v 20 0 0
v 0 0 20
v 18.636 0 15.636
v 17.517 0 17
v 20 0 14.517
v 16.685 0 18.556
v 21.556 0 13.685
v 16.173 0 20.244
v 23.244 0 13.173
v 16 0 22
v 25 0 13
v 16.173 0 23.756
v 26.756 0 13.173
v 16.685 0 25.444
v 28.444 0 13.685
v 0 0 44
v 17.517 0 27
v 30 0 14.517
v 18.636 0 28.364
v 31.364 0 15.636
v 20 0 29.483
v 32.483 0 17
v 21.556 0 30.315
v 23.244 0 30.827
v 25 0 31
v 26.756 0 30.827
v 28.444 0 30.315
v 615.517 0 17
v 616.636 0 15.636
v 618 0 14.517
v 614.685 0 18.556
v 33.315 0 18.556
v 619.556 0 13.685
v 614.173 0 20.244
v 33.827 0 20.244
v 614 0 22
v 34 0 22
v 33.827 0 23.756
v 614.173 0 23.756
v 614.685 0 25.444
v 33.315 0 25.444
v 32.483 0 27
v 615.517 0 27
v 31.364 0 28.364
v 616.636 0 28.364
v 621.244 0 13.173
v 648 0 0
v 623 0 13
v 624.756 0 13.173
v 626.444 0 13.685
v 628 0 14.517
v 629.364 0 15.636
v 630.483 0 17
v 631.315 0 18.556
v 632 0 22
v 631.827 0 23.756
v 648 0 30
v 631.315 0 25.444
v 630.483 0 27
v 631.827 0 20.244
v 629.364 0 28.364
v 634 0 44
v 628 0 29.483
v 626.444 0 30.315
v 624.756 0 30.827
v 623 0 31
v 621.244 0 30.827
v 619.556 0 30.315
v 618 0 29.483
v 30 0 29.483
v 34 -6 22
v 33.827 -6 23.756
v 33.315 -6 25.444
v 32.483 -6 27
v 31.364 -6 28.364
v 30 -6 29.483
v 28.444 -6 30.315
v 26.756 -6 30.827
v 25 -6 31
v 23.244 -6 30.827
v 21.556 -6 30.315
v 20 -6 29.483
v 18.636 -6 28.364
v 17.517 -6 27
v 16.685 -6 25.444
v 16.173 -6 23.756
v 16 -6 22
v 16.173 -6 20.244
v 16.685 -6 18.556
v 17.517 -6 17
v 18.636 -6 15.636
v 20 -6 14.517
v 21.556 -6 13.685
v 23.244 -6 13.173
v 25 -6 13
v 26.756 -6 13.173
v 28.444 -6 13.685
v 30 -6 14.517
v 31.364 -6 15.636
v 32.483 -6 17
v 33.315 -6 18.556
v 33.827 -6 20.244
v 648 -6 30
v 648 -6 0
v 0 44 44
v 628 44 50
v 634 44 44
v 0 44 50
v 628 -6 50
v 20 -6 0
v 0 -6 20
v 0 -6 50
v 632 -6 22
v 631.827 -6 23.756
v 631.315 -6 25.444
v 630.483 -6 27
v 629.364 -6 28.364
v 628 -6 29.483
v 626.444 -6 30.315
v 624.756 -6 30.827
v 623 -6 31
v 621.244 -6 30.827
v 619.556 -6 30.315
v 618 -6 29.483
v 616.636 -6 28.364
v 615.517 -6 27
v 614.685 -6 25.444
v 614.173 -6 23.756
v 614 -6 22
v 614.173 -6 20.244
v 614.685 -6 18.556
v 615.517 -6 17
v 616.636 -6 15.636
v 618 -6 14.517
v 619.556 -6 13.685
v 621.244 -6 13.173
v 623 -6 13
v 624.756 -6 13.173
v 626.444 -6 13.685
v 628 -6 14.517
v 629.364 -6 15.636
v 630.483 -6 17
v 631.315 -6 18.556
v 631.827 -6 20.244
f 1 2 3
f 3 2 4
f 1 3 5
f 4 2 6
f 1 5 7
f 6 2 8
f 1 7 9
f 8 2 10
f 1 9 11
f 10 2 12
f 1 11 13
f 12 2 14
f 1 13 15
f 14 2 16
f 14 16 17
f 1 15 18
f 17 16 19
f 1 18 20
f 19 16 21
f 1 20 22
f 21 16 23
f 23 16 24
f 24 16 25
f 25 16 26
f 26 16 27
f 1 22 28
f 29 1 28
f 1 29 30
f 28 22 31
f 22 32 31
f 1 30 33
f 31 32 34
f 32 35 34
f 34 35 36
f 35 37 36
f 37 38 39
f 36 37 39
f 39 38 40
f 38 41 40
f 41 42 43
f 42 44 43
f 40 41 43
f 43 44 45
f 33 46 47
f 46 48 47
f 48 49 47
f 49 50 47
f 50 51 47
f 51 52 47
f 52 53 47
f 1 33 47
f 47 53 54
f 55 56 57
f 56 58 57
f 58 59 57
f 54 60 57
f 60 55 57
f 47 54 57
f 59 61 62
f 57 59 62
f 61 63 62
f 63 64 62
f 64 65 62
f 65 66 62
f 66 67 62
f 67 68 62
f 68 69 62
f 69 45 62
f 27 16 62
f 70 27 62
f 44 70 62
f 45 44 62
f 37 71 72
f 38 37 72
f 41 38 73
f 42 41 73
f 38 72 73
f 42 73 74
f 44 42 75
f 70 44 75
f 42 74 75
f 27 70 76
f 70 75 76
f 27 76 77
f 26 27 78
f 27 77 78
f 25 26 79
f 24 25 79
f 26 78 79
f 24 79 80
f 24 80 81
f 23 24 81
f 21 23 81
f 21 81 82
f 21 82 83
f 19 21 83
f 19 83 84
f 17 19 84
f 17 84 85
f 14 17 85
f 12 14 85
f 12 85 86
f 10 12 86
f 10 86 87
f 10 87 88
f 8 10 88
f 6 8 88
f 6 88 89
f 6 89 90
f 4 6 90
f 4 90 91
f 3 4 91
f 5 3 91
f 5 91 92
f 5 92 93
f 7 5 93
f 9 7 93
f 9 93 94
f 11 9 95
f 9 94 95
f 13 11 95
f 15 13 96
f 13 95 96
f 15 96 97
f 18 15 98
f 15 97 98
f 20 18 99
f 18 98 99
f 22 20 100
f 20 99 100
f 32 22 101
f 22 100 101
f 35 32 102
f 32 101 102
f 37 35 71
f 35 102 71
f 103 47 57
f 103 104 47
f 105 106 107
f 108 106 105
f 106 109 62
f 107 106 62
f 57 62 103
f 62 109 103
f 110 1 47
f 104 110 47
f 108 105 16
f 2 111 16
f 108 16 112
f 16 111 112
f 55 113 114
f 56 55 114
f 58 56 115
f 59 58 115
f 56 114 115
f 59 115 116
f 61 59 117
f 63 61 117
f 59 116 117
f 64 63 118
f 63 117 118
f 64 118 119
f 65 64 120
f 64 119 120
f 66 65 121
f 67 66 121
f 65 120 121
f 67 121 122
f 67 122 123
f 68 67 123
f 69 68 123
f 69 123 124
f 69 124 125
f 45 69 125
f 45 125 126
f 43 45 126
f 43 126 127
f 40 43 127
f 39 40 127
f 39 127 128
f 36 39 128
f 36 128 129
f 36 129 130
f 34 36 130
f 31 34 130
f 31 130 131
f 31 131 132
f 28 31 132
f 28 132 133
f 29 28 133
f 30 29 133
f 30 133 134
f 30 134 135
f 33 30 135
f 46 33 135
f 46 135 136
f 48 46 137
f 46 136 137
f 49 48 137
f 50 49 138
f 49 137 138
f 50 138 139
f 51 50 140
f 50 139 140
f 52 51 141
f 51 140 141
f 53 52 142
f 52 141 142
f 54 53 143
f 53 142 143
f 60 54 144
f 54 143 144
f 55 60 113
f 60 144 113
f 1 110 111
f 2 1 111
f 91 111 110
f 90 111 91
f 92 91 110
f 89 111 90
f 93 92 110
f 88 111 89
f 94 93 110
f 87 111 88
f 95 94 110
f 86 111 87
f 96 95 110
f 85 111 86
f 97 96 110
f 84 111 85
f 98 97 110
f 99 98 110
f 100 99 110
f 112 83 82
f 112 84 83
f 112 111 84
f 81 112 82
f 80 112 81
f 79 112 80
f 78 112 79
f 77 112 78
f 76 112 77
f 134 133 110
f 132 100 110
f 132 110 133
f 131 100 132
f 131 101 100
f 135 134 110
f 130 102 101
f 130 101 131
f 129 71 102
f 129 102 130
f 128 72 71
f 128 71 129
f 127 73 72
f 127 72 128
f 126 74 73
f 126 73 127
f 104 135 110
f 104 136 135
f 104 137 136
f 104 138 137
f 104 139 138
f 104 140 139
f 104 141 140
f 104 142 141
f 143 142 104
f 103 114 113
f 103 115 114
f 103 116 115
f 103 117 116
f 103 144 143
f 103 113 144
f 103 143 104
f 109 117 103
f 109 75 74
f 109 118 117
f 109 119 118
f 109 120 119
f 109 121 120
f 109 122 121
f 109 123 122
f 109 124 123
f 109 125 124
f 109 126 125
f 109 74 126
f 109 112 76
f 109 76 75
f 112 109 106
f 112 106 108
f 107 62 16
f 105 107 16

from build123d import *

# Parameters (mm, degrees)
F0_W     = 648
F0_H     = 50
F1_DEPTH = 6
F2_W     = 648
F2_H     = 6
F3_DEPTH = 44
F4_R     = 9
F5_DEPTH = 50.001


with BuildPart() as f1:
    # F0 (on Front) → F1 (new body)
    with BuildSketch(Plane.XZ):
        with Locations((324, 25)):
            Rectangle(F0_W, F0_H)
    extrude(amount=F1_DEPTH)

    # F2 (on face) → F3 (join)
    with BuildSketch(Plane(origin=(0, 0, 0), x_dir=(-1, 0, 0), z_dir=(0, 1, 0))):
        with Locations((-324, 47)):
            Rectangle(F2_W, F2_H)
    extrude(amount=F3_DEPTH)

    # F4 (on face) → F5 (cut, through all)
    with BuildSketch(Plane.XZ.offset(6)):
        Polygon((20, 0), (0, 20), (0, 0), align=None)
        Polygon((628, 50), (648, 30), (648, 50), align=None)
        with Locations((25, 22)):
            Circle(F4_R)
        with Locations((623, 22)):
            Circle(F4_R)
    extrude(amount=-F5_DEPTH, mode=Mode.SUBTRACT)


solid = f1.part
